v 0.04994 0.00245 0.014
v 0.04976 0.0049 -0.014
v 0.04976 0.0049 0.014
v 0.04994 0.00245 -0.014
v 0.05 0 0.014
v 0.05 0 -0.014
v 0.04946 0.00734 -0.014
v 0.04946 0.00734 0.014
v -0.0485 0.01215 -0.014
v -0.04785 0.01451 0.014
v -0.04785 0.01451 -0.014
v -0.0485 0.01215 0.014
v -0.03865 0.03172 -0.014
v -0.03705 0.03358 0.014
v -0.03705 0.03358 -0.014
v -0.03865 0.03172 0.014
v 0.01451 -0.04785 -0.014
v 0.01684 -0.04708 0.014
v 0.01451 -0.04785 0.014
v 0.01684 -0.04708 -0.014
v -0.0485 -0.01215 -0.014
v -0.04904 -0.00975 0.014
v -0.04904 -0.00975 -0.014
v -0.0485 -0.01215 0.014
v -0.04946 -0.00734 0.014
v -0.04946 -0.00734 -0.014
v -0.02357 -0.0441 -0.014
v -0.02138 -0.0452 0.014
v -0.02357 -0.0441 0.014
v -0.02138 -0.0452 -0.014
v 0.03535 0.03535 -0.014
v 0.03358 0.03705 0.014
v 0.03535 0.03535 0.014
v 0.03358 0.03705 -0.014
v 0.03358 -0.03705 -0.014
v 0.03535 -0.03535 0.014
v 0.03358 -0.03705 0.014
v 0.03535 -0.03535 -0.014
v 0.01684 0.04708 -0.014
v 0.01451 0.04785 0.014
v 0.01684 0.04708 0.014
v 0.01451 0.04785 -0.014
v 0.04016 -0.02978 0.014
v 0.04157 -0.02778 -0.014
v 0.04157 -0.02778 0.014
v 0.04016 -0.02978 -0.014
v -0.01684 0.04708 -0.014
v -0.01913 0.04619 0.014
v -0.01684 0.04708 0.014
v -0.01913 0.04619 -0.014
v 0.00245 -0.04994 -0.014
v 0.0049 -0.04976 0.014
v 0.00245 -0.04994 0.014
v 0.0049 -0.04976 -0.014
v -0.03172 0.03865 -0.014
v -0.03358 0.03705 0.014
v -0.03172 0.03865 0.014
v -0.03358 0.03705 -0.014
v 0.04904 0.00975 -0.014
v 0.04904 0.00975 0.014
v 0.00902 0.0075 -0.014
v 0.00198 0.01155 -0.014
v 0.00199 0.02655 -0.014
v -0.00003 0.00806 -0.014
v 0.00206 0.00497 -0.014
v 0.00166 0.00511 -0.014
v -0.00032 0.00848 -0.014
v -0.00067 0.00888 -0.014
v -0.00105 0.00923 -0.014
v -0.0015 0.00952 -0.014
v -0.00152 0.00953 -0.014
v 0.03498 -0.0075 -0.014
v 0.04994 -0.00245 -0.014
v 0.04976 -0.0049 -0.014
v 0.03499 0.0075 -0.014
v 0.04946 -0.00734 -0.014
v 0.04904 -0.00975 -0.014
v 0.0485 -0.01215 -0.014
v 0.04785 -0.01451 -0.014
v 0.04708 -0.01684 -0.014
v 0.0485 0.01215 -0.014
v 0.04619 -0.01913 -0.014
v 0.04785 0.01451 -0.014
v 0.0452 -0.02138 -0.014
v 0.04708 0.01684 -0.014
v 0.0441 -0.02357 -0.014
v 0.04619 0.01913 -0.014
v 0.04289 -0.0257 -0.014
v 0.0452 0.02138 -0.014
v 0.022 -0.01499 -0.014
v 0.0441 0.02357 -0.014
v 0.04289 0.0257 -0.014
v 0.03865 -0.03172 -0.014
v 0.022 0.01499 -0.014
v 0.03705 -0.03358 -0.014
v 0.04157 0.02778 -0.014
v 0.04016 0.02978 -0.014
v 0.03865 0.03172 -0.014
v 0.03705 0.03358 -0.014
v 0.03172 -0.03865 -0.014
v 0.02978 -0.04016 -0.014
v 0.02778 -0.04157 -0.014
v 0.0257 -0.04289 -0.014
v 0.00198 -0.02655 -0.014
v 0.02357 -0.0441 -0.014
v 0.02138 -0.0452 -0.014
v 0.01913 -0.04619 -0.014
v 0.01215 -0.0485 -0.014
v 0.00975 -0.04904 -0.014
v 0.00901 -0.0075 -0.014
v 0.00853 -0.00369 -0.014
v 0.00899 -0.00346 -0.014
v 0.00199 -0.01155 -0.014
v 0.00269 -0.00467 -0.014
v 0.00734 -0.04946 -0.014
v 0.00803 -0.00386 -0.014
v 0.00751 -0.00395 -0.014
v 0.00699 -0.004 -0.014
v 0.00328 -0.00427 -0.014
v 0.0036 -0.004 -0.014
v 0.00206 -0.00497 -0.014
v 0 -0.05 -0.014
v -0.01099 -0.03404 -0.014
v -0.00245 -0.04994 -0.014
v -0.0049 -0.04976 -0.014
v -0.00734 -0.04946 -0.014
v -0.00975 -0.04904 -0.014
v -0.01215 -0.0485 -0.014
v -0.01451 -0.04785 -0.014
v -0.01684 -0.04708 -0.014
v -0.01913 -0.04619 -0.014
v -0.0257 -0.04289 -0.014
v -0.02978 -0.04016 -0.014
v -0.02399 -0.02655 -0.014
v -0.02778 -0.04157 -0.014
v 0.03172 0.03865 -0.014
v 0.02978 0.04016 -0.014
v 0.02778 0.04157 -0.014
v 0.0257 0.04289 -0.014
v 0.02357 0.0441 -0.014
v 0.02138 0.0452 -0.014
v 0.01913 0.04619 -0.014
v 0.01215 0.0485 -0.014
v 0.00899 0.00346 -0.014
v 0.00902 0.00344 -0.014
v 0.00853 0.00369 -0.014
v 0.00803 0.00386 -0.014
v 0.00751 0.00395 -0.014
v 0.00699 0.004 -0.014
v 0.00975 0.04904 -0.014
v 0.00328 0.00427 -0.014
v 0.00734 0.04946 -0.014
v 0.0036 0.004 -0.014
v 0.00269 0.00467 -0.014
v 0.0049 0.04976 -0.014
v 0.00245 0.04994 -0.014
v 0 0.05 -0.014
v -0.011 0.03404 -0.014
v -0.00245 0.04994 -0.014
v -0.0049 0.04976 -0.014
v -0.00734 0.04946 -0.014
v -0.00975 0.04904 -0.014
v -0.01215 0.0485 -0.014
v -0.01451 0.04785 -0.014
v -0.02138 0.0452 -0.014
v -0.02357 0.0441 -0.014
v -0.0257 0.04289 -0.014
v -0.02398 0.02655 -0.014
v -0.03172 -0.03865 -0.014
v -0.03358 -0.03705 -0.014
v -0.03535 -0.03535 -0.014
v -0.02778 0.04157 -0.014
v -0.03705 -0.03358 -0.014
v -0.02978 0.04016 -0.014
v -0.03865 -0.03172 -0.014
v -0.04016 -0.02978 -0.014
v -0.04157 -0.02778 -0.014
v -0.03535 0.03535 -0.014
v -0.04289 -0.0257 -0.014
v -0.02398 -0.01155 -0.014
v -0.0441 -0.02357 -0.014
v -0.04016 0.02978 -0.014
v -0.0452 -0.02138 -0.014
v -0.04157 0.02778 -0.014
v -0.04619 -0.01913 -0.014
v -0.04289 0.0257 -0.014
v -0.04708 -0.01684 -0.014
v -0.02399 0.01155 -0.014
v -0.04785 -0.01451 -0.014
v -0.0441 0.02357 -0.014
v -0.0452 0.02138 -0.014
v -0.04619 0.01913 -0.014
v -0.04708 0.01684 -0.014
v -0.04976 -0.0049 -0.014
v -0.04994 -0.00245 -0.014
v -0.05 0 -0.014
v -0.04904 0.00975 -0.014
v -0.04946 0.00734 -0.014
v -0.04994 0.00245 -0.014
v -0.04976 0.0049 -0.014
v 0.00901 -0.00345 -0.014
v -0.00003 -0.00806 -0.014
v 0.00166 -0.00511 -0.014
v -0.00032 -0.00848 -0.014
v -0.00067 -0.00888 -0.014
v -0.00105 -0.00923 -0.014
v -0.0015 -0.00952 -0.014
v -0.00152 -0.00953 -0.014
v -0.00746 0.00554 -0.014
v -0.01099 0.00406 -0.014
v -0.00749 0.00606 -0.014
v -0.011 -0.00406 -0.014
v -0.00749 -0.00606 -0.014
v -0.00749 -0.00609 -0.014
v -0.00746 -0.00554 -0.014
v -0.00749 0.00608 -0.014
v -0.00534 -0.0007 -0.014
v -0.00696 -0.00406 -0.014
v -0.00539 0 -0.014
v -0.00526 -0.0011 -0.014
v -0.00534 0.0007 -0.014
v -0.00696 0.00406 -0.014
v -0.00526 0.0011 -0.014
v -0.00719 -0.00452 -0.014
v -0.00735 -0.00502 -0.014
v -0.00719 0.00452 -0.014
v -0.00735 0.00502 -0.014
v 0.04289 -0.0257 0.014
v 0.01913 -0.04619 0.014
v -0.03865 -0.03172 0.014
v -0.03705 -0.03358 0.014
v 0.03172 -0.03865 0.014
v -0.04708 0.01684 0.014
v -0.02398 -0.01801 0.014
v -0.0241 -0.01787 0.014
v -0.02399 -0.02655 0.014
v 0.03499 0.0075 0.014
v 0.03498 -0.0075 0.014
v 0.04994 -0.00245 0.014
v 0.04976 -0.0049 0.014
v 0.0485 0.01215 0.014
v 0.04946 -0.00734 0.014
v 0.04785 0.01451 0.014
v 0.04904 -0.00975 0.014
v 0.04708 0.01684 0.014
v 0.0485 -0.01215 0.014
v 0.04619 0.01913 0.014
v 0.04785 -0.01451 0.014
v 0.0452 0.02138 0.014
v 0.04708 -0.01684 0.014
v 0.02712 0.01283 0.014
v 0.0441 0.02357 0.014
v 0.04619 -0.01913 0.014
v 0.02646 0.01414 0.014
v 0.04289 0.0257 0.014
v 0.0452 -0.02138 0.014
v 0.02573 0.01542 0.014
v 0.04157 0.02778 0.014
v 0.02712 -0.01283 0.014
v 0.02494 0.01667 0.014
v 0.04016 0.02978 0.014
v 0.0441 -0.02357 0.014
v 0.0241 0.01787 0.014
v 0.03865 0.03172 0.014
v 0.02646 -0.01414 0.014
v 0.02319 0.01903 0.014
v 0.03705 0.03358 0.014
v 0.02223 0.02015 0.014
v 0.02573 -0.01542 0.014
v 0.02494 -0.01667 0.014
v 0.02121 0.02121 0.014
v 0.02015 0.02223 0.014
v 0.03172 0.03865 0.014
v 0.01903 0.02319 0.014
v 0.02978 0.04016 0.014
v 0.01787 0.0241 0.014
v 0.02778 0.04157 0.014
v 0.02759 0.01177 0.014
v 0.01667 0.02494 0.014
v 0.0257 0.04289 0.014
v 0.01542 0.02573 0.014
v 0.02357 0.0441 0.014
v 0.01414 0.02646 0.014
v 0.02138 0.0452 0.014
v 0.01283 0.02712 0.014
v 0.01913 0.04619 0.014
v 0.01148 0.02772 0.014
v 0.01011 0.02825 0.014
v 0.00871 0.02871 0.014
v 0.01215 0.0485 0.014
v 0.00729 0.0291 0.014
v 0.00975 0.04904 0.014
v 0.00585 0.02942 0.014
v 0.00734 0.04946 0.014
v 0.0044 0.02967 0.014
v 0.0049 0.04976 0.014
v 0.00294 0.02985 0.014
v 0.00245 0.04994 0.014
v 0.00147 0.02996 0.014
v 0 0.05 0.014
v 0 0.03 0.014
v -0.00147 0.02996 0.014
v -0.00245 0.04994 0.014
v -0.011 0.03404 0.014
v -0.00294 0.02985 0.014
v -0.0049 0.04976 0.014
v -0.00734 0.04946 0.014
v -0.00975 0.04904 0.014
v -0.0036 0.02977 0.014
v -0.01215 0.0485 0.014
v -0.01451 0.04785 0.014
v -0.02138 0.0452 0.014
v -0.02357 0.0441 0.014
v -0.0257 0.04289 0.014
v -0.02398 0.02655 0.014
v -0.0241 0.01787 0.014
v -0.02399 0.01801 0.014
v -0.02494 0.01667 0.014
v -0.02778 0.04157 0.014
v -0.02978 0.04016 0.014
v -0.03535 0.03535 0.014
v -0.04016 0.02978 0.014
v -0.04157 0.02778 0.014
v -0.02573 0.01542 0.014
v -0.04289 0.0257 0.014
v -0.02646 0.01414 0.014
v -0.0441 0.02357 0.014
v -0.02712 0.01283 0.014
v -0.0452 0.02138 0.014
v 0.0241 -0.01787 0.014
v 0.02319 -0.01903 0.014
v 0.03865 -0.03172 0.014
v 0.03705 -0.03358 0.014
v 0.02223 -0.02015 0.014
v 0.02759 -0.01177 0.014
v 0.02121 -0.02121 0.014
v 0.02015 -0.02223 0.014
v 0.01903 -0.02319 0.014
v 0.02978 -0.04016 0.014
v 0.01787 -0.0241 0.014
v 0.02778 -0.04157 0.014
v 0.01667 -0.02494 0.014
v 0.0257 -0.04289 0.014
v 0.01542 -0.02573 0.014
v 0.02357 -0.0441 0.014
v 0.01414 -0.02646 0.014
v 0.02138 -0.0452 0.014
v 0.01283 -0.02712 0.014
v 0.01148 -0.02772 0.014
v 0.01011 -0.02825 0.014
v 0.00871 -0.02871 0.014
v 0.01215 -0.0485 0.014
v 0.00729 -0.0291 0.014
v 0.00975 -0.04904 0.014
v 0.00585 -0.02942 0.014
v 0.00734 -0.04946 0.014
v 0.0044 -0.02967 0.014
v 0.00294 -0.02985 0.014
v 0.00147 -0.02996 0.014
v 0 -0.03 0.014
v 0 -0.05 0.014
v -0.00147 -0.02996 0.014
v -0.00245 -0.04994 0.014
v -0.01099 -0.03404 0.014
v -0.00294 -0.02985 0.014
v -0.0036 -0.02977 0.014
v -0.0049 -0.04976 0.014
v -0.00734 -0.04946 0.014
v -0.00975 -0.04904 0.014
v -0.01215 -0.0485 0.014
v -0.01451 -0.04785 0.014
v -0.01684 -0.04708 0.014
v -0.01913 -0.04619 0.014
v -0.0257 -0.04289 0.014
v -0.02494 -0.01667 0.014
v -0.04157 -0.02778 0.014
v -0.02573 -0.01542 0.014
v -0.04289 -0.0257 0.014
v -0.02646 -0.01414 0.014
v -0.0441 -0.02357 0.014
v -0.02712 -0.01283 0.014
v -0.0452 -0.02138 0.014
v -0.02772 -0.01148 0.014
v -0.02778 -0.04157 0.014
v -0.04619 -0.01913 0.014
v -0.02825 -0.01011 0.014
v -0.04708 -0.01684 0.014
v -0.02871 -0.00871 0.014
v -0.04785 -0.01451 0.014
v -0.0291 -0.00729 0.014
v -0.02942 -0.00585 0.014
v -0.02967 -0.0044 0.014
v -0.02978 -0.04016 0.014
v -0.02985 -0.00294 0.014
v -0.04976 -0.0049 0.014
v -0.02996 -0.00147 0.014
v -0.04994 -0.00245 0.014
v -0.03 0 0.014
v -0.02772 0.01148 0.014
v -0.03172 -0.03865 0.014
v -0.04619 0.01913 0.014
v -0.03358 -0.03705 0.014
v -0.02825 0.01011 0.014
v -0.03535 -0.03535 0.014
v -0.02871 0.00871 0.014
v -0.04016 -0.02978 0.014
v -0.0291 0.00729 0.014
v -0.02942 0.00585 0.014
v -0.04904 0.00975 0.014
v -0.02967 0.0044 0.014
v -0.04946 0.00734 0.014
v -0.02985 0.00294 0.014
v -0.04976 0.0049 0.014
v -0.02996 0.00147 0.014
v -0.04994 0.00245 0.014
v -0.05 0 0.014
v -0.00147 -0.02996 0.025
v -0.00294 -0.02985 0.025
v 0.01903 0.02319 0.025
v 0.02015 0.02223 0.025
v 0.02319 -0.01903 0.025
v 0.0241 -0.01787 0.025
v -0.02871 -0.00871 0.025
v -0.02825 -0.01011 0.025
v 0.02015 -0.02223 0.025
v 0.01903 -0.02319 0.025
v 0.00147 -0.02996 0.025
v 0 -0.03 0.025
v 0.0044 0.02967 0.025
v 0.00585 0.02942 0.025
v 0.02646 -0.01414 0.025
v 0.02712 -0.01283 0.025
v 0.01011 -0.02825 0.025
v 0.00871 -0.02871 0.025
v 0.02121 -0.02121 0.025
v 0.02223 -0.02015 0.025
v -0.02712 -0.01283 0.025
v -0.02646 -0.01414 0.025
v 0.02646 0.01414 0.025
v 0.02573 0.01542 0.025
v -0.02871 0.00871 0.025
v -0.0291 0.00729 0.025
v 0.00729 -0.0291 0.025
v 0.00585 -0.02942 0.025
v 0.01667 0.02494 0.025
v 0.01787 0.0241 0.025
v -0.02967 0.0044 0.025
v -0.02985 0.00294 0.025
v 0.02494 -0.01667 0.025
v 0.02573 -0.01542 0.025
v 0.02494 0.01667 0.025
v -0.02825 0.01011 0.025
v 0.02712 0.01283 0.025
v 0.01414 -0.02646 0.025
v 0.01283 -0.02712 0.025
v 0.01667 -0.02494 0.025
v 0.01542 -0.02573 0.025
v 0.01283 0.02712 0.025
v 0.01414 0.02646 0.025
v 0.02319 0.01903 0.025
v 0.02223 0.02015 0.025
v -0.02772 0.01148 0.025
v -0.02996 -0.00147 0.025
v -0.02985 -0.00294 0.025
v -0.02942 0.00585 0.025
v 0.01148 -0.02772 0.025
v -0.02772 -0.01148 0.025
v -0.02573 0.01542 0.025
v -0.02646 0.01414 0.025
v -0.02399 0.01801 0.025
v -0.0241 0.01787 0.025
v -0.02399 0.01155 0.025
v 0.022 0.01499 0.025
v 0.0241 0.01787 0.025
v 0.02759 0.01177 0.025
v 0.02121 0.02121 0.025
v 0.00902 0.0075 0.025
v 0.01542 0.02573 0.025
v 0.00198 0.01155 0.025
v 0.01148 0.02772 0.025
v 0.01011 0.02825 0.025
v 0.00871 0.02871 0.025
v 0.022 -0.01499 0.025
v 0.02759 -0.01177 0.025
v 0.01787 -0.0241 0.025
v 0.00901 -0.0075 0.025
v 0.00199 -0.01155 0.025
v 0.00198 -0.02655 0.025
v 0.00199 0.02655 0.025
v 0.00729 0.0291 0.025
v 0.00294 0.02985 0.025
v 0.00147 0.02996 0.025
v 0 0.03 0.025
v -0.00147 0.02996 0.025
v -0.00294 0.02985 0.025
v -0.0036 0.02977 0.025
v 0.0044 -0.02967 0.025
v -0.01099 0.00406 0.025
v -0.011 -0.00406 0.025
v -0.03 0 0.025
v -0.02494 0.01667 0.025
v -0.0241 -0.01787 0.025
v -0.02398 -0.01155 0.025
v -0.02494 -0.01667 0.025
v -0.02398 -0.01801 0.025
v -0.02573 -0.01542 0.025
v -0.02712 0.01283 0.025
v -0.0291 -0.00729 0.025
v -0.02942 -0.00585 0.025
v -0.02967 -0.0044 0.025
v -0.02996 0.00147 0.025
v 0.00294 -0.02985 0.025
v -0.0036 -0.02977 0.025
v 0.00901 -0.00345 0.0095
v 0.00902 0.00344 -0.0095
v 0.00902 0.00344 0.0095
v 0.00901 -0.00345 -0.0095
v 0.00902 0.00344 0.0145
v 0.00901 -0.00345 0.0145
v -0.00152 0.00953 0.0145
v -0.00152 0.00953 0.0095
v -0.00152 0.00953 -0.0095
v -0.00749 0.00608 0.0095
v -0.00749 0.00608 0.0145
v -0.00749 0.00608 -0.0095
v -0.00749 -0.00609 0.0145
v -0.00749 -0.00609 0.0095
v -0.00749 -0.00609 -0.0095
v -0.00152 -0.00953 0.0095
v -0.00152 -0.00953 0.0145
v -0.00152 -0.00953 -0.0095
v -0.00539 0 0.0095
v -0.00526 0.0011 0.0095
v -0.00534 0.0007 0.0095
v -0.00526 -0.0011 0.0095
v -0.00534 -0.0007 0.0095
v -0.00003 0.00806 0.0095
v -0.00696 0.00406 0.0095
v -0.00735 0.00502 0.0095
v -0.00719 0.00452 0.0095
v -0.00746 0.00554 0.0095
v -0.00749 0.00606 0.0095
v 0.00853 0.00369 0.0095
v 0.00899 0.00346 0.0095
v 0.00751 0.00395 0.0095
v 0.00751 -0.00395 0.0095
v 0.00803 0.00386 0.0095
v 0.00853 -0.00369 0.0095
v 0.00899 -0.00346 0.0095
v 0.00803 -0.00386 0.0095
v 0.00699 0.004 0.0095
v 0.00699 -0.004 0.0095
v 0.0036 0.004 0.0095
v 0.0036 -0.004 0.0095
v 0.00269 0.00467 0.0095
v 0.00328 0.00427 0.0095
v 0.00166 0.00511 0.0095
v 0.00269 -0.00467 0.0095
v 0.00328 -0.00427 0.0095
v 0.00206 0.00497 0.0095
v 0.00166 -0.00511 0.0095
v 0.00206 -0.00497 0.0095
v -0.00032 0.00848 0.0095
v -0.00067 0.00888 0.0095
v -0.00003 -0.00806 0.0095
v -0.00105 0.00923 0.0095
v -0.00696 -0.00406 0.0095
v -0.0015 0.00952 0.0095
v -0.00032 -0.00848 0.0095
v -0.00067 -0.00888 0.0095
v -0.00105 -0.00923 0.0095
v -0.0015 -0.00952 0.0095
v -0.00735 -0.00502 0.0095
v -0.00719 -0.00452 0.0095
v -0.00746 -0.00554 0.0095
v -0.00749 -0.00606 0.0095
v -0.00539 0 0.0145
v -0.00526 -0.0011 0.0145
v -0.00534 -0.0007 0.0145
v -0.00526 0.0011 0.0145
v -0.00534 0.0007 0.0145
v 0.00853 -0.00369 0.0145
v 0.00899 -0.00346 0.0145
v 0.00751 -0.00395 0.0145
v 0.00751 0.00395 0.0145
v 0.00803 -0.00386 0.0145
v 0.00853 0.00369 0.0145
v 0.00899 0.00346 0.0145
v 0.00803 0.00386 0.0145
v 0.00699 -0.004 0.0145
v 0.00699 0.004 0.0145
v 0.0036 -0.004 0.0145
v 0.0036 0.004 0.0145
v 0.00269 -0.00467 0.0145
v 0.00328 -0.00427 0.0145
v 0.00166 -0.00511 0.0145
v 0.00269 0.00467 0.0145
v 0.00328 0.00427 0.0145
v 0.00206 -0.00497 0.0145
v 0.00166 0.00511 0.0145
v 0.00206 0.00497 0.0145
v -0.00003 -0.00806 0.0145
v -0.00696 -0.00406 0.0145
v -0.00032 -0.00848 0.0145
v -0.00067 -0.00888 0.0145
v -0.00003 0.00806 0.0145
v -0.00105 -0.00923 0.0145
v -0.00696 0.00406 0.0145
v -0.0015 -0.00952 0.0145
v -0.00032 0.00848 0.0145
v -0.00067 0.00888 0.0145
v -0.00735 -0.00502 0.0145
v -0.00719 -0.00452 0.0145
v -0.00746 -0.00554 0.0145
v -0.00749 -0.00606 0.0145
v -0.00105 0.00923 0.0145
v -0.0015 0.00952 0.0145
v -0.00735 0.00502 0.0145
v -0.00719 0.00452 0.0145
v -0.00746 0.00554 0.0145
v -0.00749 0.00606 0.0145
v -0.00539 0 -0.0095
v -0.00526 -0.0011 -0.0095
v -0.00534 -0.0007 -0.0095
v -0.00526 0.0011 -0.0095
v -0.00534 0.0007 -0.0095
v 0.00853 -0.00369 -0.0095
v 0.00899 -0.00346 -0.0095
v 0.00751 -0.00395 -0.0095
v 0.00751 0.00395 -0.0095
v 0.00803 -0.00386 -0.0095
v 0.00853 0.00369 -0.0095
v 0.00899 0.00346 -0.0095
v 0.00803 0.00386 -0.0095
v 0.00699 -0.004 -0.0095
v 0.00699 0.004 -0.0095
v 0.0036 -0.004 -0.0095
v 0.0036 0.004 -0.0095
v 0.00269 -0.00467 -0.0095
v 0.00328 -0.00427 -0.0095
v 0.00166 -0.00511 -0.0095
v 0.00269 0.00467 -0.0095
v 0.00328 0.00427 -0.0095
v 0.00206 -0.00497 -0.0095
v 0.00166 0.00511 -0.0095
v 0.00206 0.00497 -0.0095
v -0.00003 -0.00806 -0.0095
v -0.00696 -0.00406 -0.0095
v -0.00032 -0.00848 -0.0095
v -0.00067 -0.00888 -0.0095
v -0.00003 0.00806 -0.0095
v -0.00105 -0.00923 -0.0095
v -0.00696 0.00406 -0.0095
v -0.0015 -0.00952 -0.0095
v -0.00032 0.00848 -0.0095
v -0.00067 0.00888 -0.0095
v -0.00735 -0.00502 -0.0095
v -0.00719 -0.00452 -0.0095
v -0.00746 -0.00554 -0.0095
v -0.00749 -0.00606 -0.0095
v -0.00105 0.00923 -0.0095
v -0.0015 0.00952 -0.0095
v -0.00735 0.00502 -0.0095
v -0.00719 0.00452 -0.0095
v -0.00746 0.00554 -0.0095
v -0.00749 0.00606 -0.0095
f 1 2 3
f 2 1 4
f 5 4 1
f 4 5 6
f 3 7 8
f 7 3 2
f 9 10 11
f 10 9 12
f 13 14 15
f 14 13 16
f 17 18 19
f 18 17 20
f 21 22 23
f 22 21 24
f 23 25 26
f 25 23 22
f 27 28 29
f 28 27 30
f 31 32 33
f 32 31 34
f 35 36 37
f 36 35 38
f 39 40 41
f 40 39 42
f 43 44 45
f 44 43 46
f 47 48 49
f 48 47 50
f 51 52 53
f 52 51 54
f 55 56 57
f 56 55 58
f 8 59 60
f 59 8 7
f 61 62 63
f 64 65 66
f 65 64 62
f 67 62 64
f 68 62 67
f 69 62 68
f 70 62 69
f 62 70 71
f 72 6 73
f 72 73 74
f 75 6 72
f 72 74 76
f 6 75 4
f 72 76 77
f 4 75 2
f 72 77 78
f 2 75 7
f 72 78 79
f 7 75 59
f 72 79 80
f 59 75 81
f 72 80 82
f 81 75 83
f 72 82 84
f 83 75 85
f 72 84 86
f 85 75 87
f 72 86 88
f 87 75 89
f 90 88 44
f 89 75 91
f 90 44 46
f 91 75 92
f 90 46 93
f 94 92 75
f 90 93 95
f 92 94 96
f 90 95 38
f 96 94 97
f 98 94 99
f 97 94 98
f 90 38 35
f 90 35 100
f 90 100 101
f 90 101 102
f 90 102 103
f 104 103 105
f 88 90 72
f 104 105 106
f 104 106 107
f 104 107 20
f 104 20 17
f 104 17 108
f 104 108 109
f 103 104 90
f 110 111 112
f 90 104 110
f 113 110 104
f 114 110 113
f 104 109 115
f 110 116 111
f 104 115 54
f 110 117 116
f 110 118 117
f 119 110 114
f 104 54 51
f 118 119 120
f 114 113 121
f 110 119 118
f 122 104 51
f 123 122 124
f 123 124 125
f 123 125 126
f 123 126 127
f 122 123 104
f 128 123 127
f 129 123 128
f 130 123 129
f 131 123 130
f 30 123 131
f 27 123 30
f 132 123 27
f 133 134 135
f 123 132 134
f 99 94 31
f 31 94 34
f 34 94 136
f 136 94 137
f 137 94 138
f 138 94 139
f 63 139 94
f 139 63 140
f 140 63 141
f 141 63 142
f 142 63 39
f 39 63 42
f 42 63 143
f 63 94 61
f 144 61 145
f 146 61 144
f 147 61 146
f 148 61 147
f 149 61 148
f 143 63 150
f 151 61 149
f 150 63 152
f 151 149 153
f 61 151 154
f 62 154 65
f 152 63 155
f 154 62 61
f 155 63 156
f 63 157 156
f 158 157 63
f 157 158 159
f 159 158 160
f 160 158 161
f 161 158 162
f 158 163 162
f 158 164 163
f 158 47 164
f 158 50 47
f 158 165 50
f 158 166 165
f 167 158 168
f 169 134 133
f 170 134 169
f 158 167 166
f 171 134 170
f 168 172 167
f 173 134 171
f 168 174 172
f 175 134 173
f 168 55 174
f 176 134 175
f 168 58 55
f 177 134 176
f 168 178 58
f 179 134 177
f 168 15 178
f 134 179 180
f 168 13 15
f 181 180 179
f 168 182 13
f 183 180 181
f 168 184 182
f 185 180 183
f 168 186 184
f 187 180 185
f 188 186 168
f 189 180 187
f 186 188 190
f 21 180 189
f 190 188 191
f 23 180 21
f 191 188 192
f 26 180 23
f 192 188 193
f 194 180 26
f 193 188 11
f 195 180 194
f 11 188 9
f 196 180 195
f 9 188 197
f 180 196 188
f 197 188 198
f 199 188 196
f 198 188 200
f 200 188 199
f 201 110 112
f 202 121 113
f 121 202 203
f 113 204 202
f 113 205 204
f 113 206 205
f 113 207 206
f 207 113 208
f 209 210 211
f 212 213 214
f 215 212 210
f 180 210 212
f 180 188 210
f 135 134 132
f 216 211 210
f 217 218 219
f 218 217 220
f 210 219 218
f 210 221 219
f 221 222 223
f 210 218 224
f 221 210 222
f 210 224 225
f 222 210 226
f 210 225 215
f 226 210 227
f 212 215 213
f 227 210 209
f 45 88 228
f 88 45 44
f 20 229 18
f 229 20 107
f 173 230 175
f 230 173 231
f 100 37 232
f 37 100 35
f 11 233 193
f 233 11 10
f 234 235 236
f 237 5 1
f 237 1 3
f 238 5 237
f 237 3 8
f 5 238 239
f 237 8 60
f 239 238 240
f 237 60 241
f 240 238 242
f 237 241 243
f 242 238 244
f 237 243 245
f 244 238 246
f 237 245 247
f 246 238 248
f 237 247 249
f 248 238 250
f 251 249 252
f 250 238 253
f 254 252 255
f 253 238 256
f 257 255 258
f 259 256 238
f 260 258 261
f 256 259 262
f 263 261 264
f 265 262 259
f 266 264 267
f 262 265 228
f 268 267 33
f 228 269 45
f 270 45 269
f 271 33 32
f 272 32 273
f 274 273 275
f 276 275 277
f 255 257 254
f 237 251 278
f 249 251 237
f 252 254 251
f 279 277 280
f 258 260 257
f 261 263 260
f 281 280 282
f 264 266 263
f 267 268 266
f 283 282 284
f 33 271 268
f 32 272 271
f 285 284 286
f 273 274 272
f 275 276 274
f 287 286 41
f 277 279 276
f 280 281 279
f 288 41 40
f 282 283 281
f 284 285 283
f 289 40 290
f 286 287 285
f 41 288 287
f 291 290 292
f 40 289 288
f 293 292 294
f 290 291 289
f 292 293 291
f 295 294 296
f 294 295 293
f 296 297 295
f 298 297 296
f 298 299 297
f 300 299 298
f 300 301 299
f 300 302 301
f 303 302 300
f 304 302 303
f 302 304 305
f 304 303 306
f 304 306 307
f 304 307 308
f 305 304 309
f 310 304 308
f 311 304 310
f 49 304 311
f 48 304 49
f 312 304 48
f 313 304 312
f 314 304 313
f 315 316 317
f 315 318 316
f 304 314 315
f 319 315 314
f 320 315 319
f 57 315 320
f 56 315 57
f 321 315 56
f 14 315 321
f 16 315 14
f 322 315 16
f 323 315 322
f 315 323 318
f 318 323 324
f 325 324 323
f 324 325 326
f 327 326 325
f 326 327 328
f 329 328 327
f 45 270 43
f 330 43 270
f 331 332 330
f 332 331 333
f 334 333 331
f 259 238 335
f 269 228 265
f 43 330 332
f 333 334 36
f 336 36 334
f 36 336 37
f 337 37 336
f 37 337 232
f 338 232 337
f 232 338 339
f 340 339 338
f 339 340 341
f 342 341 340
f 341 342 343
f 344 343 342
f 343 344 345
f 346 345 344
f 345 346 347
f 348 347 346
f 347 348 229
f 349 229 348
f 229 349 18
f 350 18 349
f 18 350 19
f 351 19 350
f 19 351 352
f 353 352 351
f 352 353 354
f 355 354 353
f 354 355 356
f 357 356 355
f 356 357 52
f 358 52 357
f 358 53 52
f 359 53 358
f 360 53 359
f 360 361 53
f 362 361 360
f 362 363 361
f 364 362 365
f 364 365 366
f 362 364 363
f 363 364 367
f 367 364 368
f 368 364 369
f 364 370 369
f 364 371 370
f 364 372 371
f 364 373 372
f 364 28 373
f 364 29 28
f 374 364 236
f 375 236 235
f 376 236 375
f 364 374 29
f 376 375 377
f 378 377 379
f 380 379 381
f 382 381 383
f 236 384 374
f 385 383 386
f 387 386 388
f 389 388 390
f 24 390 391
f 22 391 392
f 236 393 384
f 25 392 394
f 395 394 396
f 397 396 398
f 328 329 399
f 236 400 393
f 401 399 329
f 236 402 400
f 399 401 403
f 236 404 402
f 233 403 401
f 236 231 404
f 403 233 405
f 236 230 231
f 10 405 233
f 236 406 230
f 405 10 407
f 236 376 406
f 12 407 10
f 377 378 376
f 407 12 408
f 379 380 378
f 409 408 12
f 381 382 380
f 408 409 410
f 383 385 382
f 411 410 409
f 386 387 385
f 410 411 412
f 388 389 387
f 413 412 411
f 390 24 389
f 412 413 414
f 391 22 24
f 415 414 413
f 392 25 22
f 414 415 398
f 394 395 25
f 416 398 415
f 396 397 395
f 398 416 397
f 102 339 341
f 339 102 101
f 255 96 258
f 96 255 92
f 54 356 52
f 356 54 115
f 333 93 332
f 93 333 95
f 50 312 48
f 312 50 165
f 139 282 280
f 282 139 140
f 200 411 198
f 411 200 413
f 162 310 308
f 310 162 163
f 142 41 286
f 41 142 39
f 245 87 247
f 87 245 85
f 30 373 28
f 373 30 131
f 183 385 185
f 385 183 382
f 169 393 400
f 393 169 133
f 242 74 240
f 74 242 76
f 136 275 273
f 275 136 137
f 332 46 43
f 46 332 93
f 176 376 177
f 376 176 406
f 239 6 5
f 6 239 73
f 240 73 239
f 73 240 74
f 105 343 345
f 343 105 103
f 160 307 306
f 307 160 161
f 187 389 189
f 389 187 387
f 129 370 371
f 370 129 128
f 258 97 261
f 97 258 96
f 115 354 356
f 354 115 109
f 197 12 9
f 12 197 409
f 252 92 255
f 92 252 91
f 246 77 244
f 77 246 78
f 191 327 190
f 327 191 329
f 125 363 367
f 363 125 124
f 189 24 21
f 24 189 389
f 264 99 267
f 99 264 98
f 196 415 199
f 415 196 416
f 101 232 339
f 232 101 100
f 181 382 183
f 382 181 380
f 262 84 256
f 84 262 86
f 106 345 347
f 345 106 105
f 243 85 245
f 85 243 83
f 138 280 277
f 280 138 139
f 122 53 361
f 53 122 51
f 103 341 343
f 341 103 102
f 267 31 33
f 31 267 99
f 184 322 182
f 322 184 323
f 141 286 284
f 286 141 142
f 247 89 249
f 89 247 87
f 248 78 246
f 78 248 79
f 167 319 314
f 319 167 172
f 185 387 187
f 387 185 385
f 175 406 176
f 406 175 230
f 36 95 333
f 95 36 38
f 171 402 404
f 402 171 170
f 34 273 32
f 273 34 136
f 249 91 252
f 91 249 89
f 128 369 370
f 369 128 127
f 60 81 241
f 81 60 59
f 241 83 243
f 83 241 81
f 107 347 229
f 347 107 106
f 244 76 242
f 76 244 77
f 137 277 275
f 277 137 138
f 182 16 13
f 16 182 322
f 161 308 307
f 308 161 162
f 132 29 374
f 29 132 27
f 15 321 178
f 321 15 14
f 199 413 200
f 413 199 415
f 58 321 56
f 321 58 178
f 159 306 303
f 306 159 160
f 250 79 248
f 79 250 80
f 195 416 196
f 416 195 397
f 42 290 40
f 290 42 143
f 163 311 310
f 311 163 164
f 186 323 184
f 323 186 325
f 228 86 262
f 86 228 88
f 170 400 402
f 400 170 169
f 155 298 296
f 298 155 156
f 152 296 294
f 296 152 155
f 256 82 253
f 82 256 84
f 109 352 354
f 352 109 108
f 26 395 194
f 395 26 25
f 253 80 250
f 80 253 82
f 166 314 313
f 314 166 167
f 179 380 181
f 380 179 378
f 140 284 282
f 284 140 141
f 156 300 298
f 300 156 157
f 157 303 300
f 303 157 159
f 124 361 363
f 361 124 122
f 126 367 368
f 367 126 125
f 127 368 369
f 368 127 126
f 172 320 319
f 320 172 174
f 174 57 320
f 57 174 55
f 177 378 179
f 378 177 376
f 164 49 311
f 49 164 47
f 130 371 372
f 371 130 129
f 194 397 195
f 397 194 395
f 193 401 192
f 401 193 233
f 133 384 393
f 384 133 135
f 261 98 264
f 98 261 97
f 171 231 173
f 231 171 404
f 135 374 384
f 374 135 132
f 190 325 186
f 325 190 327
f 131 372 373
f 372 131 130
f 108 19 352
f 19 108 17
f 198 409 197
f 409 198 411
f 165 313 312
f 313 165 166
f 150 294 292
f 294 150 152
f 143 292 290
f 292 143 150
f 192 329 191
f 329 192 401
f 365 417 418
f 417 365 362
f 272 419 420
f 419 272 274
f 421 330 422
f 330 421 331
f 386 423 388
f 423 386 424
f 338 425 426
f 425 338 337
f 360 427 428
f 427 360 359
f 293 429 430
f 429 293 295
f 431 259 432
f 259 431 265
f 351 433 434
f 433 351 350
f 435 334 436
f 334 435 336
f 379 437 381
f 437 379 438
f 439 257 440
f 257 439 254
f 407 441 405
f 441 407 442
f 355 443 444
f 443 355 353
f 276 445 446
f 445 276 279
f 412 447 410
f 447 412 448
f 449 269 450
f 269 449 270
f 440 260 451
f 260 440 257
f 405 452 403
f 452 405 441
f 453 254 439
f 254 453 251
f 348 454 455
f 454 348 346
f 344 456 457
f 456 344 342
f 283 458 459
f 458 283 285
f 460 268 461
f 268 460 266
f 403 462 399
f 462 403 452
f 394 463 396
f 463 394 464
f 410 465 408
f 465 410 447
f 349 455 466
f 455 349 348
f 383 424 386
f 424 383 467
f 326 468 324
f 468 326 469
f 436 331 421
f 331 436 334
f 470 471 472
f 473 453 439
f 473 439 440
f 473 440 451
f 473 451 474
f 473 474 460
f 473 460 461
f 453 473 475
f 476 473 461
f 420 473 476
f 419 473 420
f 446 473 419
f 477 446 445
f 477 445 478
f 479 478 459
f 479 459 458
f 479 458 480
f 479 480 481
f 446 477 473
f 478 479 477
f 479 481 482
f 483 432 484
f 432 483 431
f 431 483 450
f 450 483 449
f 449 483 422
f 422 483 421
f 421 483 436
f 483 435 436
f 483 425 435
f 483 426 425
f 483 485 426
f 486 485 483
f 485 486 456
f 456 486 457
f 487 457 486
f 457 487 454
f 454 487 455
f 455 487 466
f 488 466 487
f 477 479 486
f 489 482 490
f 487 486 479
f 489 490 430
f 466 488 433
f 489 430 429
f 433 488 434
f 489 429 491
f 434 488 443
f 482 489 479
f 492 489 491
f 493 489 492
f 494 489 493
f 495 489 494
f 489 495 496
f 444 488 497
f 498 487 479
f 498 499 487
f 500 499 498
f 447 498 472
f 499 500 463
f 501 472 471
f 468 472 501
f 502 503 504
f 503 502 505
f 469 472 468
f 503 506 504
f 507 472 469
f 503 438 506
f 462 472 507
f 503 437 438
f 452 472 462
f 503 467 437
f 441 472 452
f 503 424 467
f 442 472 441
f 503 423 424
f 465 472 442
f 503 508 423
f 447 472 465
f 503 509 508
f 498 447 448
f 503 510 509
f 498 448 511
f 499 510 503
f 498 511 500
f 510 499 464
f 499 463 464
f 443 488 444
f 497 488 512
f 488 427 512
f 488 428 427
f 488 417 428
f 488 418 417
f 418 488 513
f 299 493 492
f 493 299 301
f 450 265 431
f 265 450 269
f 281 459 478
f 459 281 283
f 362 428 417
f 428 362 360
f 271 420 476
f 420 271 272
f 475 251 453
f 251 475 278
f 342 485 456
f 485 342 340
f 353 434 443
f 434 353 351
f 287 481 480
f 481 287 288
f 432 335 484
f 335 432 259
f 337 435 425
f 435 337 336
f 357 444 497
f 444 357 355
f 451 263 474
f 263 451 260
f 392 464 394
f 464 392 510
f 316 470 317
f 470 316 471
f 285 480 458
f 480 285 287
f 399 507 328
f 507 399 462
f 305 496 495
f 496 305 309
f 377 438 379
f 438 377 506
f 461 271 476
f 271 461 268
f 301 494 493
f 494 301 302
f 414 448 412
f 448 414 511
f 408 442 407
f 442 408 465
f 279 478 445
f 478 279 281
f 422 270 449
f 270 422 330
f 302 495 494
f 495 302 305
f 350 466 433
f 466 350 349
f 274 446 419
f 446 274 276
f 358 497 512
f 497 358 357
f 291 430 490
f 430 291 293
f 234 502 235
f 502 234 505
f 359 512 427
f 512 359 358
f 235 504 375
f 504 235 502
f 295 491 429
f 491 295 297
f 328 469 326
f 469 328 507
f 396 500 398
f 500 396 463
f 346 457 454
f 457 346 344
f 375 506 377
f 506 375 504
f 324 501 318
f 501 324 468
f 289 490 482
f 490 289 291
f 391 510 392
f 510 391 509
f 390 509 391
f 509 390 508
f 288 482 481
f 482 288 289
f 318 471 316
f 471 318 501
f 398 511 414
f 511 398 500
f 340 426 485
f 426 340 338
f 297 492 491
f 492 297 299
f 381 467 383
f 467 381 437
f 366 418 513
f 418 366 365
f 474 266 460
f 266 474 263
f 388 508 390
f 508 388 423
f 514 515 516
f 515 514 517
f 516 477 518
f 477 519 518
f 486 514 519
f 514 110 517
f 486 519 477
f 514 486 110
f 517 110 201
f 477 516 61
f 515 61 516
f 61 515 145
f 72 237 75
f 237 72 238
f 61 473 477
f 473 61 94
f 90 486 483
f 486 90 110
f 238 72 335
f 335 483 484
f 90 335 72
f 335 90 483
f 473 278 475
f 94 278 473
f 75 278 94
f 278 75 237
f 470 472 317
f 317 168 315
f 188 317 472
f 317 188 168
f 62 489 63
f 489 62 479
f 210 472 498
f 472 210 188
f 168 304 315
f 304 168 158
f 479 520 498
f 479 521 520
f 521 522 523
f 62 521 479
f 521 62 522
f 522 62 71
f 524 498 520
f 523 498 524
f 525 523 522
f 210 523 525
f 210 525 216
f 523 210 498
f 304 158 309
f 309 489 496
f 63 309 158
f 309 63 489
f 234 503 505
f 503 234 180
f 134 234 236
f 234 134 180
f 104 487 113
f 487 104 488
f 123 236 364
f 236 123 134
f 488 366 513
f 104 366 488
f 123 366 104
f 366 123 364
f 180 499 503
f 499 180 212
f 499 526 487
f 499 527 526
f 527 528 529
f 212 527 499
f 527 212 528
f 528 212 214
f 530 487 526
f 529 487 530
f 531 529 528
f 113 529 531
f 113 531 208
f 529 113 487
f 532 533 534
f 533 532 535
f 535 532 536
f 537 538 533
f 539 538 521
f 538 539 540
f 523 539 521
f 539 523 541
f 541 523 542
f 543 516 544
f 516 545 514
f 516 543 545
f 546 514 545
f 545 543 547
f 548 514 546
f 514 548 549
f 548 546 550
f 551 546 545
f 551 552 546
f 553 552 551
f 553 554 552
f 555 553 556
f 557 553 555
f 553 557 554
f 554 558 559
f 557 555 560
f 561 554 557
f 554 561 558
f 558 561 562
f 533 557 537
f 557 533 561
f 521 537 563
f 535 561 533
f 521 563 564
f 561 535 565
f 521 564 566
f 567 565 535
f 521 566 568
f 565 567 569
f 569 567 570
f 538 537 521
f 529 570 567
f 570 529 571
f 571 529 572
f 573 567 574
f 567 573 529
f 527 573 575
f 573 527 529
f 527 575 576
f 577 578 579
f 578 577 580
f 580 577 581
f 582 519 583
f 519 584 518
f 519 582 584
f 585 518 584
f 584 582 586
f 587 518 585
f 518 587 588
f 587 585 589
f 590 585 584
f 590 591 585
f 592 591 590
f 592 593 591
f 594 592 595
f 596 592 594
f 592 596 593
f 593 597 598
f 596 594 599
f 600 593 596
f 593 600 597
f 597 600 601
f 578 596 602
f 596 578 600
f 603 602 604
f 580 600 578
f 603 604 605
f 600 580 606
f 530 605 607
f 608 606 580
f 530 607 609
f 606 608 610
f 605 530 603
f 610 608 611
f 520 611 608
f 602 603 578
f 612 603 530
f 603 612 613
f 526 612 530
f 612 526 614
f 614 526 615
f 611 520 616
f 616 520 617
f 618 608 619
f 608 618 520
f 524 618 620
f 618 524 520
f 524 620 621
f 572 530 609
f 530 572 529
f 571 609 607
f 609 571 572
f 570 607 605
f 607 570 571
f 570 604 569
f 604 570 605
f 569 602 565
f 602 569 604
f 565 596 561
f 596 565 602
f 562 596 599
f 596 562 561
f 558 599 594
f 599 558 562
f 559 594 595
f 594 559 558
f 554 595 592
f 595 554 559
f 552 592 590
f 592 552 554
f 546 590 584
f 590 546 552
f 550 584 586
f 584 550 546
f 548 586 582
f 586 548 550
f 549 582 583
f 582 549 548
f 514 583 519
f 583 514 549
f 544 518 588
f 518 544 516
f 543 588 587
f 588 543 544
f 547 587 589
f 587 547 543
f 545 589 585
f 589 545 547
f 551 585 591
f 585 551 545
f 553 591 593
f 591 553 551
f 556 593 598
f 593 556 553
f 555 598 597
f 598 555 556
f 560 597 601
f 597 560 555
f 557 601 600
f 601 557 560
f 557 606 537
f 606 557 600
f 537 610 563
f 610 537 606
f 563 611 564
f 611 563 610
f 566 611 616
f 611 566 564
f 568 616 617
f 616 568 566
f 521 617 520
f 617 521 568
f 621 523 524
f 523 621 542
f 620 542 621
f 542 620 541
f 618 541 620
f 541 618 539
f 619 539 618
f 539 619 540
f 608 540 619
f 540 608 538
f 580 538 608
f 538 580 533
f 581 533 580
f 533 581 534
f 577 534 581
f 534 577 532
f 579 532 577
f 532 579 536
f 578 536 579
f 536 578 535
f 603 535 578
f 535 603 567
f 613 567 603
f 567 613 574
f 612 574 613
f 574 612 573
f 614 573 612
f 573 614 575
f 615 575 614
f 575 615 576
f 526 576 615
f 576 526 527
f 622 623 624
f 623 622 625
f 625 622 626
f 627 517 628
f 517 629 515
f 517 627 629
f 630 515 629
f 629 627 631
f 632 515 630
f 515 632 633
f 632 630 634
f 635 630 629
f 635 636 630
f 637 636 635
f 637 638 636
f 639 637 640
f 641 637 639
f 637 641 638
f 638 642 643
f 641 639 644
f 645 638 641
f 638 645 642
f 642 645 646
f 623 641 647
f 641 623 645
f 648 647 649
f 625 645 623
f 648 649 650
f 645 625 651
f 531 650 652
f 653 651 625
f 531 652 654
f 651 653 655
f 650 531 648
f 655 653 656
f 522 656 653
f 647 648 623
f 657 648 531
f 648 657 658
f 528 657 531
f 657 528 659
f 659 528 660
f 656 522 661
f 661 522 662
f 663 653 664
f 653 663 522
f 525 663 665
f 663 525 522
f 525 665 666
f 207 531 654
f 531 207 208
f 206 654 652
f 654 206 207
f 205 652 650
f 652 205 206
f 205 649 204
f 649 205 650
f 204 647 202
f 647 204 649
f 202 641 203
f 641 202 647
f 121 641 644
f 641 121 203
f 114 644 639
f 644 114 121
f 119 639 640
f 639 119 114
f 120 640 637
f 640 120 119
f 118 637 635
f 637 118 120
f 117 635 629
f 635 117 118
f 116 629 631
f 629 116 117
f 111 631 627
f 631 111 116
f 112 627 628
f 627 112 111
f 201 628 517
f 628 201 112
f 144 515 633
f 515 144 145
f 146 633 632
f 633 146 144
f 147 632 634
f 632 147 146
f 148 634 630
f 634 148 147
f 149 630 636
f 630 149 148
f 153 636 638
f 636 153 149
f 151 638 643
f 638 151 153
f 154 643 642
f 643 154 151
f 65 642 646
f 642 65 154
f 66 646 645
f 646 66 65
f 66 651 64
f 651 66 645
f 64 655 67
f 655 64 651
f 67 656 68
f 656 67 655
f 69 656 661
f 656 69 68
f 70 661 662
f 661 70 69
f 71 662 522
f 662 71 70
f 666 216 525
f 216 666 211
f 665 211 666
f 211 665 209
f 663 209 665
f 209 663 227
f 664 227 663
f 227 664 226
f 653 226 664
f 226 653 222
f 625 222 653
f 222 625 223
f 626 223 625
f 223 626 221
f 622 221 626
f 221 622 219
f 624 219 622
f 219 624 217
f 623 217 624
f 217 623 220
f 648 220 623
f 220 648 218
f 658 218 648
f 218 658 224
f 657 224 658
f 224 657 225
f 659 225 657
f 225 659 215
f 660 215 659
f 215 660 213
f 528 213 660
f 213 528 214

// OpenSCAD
// Stepped coin-like disk with 3 HEX through-cutouts + recessed triangular/ribbed webs (both faces)
// Structural fixes:
//  - Make cutouts unambiguously HEX in face views (true 6-sided prism, rotated 30°)
//  - Make recessed 3-spoke web clearly connect the three openings on BOTH faces
//  - Recalculate all translate() values so parts touch (boss sits on flange with slight overlap)
// Notes:
//  - The "0.1 x 0.1 x 0.0 mm" bbox is physically impossible for a solid; we keep a small nonzero Z.
//  - Target bounding box: 0.1 x 0.1 x 0.04 mm

$fn = 128;

// ---- Bounding box targets ----
bbox_X = 0.1;
bbox_Y = 0.1;
bbox_Z = 0.04;

// ---- Main dimensions (fit within bbox) ----
flange_D = bbox_X;          // 0.1
flange_t = 0.028;

boss_D   = 0.06;
boss_h   = bbox_Z - flange_t;   // ensures total height = bbox_Z

// ---- Hex pattern (clearly visible) ----
hex_AF       = 0.026;       // across flats
hex_center_R = 0.022;       // radius to hex centers (triangular pattern)

// ---- Web recess (both faces) ----
web_recess_depth     = 0.004;   // depth of recess into each face
web_thickness        = 0.008;   // rib width
web_clearance_to_hex = 0.002;

eps = 0.0005;

// ---------- Helpers ----------
function clamp(x,a,b) = x < a ? a : (x > b ? b : x);

// Regular hex polygon sized by across-flats (AF)
module hex2d(af=hex_AF) {
    // For a regular hex: AF = 2*apothem; apothem = r*cos(30) => r = AF/sqrt(3)
    r = af / sqrt(3);
    polygon(points=[ for(i=[0:5]) [ r*cos(60*i), r*sin(60*i) ] ]);
}

module hex_cutout_at(xy=[0,0], rot=0, h=bbox_Z + 40*eps) {
    translate([xy[0], xy[1], 0])
        rotate([0,0,rot])
            linear_extrude(height=h, center=true, convexity=10)
                hex2d(hex_AF);
}

// Recessed 3-spoke web that CONNECTS the three hex openings (both faces)
// Implemented as: three "capsules" (hull of two circles) from center to near each hex center,
// plus a small central hub. This reads as a triangular/ribbed web in orthographic views.
module tri_web_recess(z_center=0, depth=web_recess_depth) {
    rib_r = web_thickness/2;

    // Keep ribs clear of hex openings: stop short of hex by (apothem + clearance)
    hex_apothem = hex_AF/2;
    stop_clear  = hex_apothem + web_clearance_to_hex;

    // End point along each spoke, measured from center
    spoke_end_R = max(0, hex_center_R - stop_clear);

    translate([0,0,z_center])
        linear_extrude(height=depth, center=true, convexity=10)
            union() {
                // Three spokes (capsules) from center to near each hex opening
                for(a=[0,120,240]) {
                    hull() {
                        circle(r=rib_r, $fn=48);
                        translate([spoke_end_R*cos(a), spoke_end_R*sin(a)])
                            circle(r=rib_r, $fn=48);
                    }
                }

                // Central hub to ensure connectivity and a clear "3-spoke" read
                circle(r=rib_r*1.35, $fn=48);
            }
}

// ---------- Main solid ----------
module part() {
    // Enforce exact overall height bbox_Z with a true step:
    // flange centered at z=0, boss sits on top face of flange.
    boss_h_eff   = clamp(boss_h, eps, bbox_Z - eps);
    flange_t_eff = clamp(flange_t, eps, bbox_Z - boss_h_eff);

    // Recess depth must not exceed available face thickness
    recess_d = clamp(web_recess_depth, eps, flange_t_eff/2 - 3*eps);

    // Slight overlap between flange and boss for robust union (scaled to tiny model)
    overlap_z = 2*eps;

    difference() {
        // Base: flange + raised boss (connected)
        union() {
            // Flange centered at z=0
            cylinder(d=flange_D, h=flange_t_eff, center=true);

            // Boss on top of flange:
            // flange top face at +flange_t/2
            // boss bottom face at (boss_center - boss_h/2)
            // set boss_center so boss bottom is slightly below flange top (overlap)
            boss_center_z = (flange_t_eff/2) + (boss_h_eff/2) - overlap_z;

            translate([0,0,boss_center_z])
                cylinder(d=boss_D, h=boss_h_eff, center=true);
        }

        // Three THROUGH hex cutouts (clearly hex, 120° apart)
        for(a=[0,120,240]) {
            hex_cutout_at(
                xy=[hex_center_R*cos(a), hex_center_R*sin(a)],
                rot=30,                       // flats horizontal/vertical in views
                h=bbox_Z + 40*eps
            );
        }

        // Recessed webs on BOTH faces of the flange (do not cut through)
        // Top face of flange at +flange_t/2, bottom face at -flange_t/2
        tri_web_recess(
            z_center= (flange_t_eff/2) - (recess_d/2),
            depth=recess_d + 2*eps
        );
        tri_web_recess(
            z_center=-(flange_t_eff/2) + (recess_d/2),
            depth=recess_d + 2*eps
        );
    }
}

part();
